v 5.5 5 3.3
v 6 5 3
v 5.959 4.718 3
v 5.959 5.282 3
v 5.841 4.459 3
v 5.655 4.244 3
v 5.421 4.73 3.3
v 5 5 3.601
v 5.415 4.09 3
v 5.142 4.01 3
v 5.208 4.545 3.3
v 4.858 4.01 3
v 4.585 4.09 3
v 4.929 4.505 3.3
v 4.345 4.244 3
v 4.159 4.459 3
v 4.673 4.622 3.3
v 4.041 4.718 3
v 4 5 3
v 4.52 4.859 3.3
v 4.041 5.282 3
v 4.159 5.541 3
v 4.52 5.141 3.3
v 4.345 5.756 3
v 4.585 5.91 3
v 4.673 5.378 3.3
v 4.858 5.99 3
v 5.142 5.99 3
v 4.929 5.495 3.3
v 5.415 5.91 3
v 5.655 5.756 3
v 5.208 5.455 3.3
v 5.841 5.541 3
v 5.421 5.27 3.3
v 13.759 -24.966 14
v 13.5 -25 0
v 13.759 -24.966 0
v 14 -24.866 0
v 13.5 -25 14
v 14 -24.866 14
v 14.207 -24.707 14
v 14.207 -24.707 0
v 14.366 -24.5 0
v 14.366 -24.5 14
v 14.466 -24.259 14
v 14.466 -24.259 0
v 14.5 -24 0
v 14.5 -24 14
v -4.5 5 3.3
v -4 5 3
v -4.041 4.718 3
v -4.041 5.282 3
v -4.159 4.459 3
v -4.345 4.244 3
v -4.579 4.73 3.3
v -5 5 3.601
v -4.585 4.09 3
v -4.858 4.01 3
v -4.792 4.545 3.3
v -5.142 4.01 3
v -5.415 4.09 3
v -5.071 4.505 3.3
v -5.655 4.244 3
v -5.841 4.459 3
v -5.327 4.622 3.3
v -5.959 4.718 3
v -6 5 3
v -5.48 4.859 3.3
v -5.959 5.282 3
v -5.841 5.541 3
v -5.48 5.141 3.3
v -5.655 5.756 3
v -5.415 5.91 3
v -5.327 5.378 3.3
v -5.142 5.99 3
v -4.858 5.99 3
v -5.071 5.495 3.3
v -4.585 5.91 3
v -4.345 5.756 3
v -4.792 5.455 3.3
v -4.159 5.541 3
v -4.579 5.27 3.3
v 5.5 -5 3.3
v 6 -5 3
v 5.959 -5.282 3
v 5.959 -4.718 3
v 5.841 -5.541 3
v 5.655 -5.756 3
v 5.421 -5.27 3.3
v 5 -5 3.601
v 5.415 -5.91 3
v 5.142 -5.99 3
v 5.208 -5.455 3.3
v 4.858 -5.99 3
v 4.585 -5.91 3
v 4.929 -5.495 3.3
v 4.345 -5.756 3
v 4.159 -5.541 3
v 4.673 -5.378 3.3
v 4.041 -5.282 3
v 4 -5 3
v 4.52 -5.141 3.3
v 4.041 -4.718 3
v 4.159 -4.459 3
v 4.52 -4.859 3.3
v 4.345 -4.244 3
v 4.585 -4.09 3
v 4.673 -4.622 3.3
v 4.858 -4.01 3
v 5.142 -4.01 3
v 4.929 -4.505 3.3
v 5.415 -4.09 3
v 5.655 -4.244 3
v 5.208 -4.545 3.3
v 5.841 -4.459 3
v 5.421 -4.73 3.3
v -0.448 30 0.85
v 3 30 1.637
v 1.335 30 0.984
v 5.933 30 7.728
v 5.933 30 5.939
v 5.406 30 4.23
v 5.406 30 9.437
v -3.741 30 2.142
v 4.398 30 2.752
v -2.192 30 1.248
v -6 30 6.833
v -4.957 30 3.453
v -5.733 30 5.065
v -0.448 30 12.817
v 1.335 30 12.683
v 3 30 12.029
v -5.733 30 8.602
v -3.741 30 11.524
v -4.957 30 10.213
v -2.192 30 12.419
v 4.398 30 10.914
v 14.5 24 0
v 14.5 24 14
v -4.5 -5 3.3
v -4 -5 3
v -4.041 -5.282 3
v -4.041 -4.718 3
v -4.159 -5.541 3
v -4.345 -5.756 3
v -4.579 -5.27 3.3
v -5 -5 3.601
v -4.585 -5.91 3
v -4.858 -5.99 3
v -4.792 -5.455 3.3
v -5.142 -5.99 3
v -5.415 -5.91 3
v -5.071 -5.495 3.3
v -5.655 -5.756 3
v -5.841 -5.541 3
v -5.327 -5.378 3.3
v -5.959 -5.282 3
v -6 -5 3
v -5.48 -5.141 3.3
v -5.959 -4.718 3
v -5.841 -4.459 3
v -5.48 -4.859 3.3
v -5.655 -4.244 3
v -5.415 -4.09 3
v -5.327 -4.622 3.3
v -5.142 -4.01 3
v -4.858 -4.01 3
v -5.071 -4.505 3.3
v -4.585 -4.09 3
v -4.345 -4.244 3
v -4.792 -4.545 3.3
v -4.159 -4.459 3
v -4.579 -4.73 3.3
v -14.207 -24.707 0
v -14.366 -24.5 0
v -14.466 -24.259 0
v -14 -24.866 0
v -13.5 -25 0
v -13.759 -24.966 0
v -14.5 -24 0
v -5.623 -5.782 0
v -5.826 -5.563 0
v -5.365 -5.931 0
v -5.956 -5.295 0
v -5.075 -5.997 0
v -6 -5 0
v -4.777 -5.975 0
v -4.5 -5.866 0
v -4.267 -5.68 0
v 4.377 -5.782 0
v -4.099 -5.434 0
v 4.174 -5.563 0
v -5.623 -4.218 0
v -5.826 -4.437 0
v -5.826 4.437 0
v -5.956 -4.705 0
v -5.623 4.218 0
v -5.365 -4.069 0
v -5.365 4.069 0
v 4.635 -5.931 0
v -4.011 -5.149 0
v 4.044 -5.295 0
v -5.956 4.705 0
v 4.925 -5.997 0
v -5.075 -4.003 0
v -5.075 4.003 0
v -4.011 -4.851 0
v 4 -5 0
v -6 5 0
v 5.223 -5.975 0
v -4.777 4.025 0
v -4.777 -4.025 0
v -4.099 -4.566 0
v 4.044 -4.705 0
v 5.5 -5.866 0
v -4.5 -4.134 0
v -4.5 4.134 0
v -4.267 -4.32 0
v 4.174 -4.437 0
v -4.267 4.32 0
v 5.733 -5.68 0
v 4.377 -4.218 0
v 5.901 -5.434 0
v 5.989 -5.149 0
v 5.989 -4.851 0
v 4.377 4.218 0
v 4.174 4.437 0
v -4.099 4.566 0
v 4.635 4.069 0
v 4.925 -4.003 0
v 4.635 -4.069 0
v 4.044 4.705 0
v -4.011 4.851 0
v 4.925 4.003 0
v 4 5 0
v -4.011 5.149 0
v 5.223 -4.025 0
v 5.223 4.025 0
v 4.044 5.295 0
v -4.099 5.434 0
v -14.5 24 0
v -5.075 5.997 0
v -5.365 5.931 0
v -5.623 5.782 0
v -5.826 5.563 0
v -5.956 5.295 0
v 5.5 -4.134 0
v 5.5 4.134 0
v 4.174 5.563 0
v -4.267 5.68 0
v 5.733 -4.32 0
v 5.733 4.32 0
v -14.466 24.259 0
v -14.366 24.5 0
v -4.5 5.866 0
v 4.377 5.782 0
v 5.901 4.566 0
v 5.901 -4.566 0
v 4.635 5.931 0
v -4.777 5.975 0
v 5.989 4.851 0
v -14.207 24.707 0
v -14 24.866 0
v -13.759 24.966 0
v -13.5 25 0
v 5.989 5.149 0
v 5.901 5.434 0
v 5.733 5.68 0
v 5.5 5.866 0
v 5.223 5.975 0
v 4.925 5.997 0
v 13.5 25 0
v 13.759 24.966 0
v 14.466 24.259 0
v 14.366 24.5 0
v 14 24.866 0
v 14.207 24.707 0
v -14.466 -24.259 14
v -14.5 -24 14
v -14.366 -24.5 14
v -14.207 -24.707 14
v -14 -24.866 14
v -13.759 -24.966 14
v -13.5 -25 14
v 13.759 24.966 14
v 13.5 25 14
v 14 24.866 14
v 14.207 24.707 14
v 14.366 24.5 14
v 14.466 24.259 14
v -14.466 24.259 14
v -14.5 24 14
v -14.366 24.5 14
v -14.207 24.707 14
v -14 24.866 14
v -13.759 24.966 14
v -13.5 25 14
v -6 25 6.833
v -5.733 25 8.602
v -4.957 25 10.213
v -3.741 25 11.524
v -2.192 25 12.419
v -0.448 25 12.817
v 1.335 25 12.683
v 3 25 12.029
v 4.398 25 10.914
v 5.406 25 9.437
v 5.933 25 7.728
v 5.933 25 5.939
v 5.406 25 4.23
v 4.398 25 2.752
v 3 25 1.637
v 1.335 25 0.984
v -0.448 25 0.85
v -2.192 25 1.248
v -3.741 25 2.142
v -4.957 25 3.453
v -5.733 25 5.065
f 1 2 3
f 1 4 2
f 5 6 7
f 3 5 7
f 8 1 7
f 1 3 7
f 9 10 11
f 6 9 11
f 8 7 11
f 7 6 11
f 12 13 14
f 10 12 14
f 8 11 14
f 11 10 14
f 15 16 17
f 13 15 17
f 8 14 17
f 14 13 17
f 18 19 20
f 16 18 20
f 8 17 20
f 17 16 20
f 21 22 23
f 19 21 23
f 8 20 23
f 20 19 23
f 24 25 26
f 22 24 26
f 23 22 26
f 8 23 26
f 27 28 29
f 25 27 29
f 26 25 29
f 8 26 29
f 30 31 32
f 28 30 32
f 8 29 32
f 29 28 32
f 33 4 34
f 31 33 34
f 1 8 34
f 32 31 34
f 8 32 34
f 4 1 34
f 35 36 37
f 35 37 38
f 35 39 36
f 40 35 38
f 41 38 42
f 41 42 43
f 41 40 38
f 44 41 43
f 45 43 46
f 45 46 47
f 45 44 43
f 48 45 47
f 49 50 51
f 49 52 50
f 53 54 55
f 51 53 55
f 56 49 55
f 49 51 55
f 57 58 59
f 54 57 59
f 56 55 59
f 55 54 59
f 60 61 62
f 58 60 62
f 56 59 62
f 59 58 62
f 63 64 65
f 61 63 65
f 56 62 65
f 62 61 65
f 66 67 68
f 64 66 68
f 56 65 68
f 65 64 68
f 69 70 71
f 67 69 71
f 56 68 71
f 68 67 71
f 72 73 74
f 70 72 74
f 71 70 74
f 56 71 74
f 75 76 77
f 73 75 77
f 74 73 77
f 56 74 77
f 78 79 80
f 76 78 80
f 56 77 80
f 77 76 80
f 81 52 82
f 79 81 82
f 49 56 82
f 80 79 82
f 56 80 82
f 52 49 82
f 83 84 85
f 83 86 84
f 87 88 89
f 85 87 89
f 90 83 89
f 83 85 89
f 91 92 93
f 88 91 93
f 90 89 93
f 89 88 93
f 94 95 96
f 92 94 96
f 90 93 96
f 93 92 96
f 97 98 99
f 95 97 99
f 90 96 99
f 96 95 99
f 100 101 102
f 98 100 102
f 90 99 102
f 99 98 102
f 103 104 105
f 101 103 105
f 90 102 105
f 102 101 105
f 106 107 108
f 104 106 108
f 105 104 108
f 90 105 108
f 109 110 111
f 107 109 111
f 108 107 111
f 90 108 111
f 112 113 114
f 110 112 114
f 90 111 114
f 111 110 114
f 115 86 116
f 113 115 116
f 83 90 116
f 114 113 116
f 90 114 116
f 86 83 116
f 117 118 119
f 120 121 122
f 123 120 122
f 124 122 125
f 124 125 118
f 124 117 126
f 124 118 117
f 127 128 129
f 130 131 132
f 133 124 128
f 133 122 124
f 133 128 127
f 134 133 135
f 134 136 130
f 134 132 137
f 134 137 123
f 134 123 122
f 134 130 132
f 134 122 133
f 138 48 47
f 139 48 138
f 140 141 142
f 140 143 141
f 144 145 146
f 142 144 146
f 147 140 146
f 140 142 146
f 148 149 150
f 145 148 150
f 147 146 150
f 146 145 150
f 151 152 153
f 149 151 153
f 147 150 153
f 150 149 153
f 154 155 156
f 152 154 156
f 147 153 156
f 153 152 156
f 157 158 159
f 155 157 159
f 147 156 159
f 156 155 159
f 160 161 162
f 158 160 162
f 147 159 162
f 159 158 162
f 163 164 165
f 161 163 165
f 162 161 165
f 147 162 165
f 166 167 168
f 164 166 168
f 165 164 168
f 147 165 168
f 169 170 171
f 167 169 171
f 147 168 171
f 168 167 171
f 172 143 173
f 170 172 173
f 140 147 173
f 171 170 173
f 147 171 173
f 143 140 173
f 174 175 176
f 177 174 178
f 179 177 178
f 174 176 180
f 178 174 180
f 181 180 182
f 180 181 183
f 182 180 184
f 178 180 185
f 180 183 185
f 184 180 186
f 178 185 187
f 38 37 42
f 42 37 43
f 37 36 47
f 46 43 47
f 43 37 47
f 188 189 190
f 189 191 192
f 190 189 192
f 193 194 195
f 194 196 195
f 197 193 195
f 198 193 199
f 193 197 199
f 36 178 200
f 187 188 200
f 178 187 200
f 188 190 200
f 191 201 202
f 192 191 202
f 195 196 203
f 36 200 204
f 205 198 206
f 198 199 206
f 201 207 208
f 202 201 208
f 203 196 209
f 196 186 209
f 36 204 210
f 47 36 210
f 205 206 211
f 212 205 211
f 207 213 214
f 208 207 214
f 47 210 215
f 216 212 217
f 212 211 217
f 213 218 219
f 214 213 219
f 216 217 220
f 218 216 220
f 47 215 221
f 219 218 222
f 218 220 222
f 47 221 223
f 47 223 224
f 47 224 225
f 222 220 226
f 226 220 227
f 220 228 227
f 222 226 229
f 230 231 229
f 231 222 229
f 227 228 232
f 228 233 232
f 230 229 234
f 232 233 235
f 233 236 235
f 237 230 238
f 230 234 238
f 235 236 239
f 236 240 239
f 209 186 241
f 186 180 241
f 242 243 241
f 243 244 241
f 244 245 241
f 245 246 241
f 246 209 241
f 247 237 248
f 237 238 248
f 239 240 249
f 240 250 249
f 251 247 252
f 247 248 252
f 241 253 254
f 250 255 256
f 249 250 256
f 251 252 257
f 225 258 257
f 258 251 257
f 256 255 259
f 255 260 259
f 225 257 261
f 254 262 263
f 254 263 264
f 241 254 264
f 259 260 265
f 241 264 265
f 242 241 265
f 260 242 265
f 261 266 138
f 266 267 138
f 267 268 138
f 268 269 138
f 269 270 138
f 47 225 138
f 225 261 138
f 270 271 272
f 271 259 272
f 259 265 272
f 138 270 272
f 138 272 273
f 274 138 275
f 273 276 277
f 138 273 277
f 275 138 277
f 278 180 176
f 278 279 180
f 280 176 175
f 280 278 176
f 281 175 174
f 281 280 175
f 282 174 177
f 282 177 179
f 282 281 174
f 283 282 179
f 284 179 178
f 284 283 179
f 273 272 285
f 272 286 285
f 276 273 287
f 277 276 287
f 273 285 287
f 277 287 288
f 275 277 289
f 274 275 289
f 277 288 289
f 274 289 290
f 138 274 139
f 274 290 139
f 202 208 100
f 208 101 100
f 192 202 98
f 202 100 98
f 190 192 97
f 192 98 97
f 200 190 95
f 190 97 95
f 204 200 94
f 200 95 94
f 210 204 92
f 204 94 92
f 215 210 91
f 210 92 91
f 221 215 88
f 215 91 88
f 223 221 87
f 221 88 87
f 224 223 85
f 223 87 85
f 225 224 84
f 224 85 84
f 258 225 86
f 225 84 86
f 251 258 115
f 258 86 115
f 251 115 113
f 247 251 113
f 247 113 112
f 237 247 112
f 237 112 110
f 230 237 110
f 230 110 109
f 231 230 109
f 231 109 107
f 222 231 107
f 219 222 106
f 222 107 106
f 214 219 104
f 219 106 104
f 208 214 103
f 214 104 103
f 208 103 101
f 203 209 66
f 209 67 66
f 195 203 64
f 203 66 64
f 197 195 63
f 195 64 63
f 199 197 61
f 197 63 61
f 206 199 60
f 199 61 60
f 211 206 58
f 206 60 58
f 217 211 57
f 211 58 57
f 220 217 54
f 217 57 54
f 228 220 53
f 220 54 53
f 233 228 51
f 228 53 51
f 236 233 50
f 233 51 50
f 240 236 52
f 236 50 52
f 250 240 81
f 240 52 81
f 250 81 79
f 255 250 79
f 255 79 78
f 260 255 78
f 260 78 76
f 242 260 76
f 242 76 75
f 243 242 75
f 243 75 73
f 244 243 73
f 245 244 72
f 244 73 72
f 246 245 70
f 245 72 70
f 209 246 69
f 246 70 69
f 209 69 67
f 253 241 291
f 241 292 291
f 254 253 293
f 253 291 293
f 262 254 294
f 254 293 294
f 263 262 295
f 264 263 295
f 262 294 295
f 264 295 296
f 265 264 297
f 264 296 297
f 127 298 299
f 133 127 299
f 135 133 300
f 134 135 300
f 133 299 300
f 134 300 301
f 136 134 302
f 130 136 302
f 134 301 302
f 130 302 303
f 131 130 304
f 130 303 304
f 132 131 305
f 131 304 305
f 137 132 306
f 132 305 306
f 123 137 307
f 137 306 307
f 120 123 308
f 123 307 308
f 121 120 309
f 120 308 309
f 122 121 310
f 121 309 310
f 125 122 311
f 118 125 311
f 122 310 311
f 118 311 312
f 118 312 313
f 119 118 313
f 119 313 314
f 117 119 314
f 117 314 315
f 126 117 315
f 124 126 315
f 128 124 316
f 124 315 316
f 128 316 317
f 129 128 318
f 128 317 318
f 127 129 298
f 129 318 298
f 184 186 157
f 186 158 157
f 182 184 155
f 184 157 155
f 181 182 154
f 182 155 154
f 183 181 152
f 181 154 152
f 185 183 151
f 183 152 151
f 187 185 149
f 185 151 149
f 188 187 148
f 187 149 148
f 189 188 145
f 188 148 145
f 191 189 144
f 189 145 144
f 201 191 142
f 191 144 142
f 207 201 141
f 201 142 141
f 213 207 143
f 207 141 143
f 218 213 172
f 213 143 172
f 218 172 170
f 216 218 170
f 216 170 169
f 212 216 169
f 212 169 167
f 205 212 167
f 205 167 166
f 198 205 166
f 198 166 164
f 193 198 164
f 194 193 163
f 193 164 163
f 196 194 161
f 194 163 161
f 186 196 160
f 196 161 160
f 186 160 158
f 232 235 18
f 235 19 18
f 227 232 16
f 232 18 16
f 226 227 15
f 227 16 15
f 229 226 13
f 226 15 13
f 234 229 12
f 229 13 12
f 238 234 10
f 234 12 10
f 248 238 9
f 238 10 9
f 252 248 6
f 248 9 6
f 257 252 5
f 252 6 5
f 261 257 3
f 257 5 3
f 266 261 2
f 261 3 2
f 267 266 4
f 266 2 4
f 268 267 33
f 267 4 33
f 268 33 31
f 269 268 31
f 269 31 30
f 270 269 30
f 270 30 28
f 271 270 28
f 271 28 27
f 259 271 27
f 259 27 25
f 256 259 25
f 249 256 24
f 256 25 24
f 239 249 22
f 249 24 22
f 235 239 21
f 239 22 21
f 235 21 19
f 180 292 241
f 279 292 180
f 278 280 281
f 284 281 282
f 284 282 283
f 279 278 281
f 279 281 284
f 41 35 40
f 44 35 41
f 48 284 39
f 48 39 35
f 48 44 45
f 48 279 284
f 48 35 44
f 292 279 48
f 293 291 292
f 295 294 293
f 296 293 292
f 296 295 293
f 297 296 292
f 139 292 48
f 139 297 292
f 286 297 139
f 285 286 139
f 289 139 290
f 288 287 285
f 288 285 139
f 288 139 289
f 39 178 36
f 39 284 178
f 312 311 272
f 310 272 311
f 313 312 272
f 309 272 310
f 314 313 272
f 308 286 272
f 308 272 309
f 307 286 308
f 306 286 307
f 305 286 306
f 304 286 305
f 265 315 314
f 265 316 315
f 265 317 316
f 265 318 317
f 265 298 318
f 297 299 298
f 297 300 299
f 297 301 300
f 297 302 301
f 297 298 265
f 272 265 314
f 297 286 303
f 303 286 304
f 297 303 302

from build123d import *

# Parameters (mm, degrees)
F0_W     = 29
F0_H     = 50
F3_D     = 2
F3_DEPTH = 3
F3_TIP   = 0.600860619
F4_R     = 1
F5_R     = 6
F6_DEPTH = 5


with BuildPart() as f2:
    # F2: sweep along a path in F1
    with BuildLine(Plane.XZ) as f2_path:
        Line((0, 0), (0, 14))
    # F0 (on Top) → F2 (sweep)
    with BuildSketch(Plane.XY):
        Rectangle(F0_W, F0_H)
    sweep(path=f2_path.line)

    # F3
    with Locations(Plane(origin=(0, 0, 0), x_dir=(1, 0, 0), z_dir=(0, 0, -1))):
        with Locations((5, -5), (-5, -5), (-5, 5), (5, 5)):
            Hole(F3_D / 2, depth=F3_DEPTH)
            with Locations((0, 0, -(F3_DEPTH + F3_TIP / 2))):  # 118° drill point
                Cone(0, F3_D / 2, F3_TIP, mode=Mode.SUBTRACT)

    # F4
    f4_edges = [f2.edges().sort_by_distance(p)[0] for p in [
        (14.5, -25, 7),
        (-14.5, -25, 7),
        (14.5, 25, 7),
        (-14.5, 25, 7),
    ]]
    fillet(f4_edges, radius=F4_R)

    # F5 (on face) → F6 (join)
    with BuildSketch(Plane(origin=(0, 25, 0), x_dir=(-1, 0, 0), z_dir=(0, 1, 0))):
        with Locations((0, 6.833284162)):
            Circle(F5_R)
    extrude(amount=F6_DEPTH)


solid = f2.part
